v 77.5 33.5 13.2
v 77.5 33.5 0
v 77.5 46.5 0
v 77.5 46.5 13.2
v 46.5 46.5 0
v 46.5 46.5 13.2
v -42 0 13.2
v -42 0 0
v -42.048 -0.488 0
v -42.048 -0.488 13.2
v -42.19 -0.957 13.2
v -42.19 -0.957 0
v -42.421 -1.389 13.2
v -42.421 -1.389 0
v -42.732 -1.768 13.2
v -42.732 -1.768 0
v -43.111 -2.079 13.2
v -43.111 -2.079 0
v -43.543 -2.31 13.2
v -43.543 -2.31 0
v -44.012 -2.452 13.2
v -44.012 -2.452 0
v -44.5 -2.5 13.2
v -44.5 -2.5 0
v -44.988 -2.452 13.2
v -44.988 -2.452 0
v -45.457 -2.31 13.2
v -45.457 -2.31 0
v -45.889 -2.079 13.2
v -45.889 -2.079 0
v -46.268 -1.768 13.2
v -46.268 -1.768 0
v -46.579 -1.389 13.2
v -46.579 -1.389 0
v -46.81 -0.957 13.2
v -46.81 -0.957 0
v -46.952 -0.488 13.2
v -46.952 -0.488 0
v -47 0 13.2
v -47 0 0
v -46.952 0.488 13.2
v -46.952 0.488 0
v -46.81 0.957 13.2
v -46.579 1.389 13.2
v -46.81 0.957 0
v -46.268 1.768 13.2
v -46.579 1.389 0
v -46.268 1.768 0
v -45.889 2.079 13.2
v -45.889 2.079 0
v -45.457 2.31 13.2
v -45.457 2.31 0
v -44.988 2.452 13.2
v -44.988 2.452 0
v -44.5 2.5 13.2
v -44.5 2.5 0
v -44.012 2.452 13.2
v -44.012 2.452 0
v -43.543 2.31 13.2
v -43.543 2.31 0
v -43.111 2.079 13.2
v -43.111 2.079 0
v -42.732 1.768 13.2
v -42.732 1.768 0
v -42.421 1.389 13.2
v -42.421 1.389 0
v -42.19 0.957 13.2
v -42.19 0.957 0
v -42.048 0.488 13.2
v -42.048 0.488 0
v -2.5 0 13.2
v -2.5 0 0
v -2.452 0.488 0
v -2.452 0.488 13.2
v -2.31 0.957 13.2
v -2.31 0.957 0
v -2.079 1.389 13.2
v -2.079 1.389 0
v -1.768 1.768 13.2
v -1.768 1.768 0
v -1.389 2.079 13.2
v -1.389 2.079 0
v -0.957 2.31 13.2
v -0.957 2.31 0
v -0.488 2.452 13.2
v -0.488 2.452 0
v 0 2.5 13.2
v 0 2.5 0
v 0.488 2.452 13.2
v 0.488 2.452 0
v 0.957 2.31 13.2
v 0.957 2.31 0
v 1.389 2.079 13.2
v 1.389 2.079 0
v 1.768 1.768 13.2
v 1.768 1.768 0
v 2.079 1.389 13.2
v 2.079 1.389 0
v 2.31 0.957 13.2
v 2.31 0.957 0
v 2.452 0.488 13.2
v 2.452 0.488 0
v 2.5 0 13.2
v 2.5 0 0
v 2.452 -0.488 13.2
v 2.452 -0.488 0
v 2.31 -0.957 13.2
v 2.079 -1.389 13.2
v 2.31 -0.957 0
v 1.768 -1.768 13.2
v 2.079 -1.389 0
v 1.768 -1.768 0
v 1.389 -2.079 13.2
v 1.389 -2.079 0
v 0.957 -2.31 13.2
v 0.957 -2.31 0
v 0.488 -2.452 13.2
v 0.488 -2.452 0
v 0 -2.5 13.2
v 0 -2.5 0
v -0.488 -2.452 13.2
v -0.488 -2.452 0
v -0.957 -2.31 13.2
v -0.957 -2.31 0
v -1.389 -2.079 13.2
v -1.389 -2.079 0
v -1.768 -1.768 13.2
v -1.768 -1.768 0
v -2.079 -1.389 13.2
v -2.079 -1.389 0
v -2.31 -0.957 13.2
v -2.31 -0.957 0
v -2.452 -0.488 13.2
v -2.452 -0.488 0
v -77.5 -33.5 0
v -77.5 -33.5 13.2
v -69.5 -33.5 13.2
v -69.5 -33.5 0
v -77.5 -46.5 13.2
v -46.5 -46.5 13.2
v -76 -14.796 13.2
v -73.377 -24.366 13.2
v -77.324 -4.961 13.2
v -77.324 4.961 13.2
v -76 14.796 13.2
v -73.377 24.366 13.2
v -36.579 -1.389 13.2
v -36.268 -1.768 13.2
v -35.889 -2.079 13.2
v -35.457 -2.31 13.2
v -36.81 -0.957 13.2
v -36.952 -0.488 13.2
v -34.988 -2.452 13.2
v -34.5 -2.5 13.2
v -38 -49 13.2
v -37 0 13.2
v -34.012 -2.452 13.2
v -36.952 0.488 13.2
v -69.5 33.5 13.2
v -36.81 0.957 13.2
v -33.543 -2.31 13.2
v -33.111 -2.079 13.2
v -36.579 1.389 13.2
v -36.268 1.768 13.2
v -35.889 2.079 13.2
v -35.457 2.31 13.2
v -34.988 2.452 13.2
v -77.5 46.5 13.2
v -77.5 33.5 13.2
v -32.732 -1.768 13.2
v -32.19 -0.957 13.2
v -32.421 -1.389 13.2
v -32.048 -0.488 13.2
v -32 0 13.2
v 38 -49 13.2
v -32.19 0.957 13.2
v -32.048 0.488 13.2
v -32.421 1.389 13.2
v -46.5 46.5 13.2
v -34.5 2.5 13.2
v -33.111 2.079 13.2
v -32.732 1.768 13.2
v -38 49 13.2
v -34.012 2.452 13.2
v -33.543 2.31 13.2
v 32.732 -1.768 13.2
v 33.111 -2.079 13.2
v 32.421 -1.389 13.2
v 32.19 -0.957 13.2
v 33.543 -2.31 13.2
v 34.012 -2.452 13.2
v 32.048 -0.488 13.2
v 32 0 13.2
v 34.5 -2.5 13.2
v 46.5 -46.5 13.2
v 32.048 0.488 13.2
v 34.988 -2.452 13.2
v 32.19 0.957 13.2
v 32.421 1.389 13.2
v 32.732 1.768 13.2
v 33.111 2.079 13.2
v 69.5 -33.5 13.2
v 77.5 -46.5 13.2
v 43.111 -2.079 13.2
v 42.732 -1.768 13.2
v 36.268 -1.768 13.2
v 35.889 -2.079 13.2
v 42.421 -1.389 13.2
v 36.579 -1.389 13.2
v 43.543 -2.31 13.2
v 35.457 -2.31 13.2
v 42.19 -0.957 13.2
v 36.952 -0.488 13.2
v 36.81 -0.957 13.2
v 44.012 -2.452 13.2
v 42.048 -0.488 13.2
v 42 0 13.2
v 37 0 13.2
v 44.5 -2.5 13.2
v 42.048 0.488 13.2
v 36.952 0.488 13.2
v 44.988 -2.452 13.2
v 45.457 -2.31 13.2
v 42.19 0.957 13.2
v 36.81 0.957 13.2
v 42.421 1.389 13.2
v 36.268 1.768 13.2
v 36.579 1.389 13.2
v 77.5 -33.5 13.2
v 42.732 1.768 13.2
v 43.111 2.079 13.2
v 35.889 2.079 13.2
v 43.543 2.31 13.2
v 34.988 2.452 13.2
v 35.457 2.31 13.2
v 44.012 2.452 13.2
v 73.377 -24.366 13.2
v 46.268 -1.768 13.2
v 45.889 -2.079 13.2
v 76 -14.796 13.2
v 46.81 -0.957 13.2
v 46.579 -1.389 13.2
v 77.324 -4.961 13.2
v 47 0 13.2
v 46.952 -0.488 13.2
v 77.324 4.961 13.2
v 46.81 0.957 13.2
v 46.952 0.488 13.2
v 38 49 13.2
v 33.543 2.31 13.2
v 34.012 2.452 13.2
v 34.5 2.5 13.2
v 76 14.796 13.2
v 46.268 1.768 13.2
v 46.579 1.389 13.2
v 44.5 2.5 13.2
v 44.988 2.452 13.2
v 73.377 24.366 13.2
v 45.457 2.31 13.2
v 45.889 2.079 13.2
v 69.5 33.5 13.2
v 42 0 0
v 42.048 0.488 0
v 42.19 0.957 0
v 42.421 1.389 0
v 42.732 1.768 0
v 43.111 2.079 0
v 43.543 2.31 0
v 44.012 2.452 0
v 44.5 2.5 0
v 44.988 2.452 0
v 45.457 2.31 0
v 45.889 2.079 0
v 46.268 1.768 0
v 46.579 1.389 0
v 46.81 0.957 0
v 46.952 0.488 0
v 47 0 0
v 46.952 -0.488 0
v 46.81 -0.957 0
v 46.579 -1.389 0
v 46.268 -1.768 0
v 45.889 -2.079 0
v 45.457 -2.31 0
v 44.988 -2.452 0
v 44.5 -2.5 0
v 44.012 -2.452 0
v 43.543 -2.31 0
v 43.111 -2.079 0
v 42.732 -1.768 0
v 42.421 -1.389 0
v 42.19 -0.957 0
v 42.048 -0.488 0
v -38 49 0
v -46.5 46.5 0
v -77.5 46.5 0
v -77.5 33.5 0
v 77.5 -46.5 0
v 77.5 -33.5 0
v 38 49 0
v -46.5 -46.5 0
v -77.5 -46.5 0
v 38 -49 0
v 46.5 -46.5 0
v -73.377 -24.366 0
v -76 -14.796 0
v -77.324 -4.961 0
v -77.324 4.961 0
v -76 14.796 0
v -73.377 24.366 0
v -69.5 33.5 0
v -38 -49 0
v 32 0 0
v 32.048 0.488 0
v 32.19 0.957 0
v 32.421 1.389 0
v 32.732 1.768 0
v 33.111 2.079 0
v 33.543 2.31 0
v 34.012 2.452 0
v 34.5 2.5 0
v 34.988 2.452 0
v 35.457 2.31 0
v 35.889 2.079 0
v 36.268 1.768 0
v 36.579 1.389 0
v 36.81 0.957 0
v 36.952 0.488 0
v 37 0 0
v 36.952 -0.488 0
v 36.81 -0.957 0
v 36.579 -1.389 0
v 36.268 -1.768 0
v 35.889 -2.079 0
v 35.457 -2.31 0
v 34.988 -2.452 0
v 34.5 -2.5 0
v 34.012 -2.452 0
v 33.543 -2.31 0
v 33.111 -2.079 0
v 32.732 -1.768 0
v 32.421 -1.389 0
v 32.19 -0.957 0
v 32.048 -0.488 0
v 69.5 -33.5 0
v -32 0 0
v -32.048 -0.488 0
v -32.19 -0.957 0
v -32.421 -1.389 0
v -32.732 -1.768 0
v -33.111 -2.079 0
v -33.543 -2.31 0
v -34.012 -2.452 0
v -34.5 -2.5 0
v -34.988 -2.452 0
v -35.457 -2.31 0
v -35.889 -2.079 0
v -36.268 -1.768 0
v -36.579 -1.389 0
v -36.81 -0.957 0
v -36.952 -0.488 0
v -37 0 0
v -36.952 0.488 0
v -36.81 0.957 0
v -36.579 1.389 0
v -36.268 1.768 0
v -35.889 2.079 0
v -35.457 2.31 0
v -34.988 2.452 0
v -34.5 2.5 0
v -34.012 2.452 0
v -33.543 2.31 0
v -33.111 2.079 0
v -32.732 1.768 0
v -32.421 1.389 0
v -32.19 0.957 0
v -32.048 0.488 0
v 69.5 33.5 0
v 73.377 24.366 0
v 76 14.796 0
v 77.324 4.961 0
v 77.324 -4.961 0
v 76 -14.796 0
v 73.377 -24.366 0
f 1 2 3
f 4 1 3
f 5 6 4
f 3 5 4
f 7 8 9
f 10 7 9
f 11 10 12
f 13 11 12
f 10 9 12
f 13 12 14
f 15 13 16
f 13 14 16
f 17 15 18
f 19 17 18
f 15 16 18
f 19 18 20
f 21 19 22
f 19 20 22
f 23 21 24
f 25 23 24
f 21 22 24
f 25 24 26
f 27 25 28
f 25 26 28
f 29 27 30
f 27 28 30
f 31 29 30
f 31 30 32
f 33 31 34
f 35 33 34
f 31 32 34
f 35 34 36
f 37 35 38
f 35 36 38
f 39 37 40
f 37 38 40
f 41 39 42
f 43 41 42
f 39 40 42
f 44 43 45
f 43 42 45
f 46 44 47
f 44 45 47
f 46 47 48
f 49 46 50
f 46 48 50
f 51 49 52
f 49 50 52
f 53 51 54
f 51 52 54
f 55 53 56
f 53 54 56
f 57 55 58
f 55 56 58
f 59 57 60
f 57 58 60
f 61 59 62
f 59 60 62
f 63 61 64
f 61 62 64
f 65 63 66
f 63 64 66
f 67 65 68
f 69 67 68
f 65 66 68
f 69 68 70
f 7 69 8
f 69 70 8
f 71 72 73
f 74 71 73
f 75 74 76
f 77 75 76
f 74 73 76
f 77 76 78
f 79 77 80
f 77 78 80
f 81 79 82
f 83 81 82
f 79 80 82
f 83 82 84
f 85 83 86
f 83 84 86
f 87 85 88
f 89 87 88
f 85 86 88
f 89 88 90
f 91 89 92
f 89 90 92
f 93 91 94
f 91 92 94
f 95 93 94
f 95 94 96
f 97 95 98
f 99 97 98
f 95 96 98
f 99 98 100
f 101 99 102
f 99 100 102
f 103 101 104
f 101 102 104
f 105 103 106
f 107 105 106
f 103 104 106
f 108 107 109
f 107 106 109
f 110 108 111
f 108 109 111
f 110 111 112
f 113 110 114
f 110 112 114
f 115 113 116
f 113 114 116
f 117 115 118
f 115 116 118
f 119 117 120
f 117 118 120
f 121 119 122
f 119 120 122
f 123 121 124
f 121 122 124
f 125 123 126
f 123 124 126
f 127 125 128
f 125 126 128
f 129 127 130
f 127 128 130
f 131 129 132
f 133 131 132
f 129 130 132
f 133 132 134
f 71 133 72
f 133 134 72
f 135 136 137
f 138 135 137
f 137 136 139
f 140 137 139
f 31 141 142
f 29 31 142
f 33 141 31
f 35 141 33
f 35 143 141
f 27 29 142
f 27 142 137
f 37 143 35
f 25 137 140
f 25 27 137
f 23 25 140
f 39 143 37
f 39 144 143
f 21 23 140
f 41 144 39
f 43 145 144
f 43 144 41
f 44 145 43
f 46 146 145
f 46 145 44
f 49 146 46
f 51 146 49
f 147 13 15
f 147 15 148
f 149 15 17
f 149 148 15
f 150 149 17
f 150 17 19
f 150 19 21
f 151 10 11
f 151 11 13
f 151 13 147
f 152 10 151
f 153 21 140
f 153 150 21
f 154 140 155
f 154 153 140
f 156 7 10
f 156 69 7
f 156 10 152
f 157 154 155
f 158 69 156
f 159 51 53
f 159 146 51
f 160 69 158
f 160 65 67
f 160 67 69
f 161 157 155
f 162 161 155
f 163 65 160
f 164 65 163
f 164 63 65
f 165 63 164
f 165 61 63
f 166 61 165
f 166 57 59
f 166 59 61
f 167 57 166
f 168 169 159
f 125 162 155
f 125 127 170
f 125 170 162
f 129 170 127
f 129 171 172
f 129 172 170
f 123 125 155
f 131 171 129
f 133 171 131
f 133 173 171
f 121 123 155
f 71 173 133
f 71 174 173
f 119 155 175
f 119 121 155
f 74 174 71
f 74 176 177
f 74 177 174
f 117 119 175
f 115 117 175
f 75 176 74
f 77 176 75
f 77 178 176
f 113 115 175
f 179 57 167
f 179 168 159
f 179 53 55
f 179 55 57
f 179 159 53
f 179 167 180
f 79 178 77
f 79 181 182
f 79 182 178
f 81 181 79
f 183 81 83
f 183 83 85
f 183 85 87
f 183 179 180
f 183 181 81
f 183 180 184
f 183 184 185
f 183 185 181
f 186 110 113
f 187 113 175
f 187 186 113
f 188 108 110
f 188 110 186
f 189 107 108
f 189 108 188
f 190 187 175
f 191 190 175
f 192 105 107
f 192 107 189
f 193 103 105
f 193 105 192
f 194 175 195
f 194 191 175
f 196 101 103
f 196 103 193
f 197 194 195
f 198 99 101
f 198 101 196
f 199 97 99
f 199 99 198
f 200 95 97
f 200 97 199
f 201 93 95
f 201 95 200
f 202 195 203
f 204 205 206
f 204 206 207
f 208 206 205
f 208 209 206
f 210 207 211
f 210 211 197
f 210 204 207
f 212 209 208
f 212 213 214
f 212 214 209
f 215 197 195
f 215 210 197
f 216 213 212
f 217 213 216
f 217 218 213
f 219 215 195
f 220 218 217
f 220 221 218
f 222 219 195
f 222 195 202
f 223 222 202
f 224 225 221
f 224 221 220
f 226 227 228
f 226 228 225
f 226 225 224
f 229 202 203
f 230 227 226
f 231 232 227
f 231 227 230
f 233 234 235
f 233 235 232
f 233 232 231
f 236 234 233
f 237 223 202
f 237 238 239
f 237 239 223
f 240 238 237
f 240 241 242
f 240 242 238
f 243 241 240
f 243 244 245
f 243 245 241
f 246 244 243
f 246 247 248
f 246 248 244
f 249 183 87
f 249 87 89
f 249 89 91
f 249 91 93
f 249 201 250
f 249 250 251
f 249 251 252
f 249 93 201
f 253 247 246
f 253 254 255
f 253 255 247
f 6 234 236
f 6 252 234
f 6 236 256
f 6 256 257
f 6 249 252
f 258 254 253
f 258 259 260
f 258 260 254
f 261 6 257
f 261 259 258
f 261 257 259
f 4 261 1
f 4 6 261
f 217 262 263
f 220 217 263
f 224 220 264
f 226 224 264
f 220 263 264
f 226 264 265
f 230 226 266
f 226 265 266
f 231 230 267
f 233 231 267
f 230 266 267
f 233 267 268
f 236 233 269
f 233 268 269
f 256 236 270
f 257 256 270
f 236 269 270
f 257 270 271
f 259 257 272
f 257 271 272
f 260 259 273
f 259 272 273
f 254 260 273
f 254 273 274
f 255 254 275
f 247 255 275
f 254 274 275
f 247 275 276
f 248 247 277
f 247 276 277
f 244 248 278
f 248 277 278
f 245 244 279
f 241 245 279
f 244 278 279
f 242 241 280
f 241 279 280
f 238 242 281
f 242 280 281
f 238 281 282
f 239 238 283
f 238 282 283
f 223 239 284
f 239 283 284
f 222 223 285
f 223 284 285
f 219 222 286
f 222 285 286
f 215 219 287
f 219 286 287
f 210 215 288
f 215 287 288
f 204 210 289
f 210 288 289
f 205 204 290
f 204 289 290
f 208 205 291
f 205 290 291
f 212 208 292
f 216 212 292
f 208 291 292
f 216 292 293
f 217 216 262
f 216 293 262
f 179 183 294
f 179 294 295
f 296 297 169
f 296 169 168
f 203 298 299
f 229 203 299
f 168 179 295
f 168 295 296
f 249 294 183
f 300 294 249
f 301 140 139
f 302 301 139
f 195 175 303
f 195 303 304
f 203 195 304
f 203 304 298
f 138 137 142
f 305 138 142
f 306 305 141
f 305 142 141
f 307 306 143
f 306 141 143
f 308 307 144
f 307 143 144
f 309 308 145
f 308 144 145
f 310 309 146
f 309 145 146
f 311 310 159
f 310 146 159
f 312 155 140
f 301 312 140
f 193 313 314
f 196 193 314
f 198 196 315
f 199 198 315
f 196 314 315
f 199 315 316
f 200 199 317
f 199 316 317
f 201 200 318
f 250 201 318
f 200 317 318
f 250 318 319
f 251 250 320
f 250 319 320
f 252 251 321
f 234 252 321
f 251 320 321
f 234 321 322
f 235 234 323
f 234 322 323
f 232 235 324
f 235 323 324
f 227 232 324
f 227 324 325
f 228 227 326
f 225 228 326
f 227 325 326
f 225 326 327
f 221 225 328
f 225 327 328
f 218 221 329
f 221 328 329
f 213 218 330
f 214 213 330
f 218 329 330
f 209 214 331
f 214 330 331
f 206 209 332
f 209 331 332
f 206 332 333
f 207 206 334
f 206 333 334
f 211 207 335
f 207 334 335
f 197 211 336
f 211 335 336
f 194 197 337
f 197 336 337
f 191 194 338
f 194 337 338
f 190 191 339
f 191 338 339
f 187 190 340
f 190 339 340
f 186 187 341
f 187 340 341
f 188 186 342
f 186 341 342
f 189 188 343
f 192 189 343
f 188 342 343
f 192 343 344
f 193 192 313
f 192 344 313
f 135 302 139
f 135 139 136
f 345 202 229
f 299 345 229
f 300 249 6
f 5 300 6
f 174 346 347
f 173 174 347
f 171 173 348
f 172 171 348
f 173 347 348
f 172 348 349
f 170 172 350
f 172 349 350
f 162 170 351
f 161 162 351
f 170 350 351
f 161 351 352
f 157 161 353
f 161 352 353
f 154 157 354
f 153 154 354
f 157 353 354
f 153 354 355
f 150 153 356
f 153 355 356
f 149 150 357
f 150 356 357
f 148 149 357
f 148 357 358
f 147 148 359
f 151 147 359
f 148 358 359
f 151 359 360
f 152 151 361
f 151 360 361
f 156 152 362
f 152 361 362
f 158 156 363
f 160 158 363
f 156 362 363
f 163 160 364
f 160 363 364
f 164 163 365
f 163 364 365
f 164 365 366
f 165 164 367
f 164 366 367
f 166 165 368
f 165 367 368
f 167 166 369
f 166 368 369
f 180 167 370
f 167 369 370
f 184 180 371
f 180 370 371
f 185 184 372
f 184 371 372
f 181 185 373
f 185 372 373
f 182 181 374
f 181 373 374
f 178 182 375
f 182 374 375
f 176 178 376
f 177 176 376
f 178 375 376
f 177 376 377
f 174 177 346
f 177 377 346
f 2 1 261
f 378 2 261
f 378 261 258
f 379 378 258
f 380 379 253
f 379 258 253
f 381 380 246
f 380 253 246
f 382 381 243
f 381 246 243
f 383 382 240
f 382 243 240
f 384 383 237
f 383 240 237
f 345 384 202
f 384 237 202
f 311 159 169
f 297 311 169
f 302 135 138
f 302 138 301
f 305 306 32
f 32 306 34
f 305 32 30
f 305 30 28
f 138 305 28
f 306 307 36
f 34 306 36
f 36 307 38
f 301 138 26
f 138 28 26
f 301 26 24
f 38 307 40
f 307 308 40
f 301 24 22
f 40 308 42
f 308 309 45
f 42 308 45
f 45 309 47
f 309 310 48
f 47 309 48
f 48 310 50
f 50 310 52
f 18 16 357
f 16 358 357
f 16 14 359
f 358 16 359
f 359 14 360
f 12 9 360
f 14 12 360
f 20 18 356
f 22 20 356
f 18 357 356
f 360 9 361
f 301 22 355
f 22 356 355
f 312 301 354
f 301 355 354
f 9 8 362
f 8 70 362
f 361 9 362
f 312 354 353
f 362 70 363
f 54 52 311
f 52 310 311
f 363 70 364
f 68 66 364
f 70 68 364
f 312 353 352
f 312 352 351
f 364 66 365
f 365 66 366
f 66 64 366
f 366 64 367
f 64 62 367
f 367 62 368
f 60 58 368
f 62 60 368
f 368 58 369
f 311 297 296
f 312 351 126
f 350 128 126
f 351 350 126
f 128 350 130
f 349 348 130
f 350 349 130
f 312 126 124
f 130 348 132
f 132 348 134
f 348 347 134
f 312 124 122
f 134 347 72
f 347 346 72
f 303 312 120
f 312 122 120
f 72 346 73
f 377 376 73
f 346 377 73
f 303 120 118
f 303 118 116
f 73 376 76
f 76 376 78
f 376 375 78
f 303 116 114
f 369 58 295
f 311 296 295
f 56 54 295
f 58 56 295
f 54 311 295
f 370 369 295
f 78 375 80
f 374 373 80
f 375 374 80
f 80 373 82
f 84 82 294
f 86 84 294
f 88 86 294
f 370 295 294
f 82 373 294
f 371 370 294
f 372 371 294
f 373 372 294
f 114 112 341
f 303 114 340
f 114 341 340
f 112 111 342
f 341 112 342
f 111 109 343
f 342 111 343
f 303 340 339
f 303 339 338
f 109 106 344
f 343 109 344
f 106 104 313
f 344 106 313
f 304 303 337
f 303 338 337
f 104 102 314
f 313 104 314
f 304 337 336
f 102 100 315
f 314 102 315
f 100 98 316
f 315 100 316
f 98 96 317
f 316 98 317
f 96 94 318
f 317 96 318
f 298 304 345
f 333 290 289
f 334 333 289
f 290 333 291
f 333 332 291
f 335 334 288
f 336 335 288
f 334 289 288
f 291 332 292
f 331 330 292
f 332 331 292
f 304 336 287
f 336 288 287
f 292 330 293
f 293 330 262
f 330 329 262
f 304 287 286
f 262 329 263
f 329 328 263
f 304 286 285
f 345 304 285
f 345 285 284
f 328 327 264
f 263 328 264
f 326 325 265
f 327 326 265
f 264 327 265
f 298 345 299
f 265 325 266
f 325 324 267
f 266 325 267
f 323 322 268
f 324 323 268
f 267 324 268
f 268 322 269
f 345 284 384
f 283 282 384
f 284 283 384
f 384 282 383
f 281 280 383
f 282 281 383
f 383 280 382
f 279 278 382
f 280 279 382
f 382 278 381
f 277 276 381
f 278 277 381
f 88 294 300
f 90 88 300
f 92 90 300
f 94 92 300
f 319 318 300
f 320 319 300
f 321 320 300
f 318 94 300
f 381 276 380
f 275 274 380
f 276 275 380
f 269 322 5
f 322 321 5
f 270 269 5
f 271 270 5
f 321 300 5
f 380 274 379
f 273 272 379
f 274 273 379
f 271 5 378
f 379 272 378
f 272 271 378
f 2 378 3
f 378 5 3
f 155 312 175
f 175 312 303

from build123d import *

# Parameters (mm, degrees)
SKETCH_1_W          = 155
SKETCH_1_H          = 98
EXTRUDE_1_DEPTH     = 13.2
CUT_EXTRUDE_1_DEPTH = 93.636331965
CUT_EXTRUDE_2_DEPTH = 93.636331965
SKETCH_4_R          = 2.5
CUT_EXTRUDE_3_DEPTH = 13.2


with BuildPart() as part:
    # 草图1 → 凸台-拉伸1 (new body)
    with BuildSketch(Plane.XY):
        Rectangle(SKETCH_1_W, SKETCH_1_H)
    extrude(amount=EXTRUDE_1_DEPTH)

    # 草图2 → 切除-拉伸1 (cut, through all)
    with BuildSketch(Plane.XY.offset(13.2)):
        Polygon((-38, 49), (-46.5, 46.5), (-77.5, 46.5), (-77.5, 49), align=None)
        Polygon((77.5, 49), (38, 49), (46.5, 46.5), (77.5, 46.5), align=None)
        Polygon((38, -49), (46.5, -46.5), (77.5, -46.5), (77.5, -49), align=None)
        Polygon((-77.5, -49), (-38, -49), (-46.5, -46.5), (-77.5, -46.5), align=None)
    extrude(amount=-CUT_EXTRUDE_1_DEPTH, mode=Mode.SUBTRACT)

    # 草图3 → 切除-拉伸2 (cut, through all)
    with BuildSketch(Plane.XY.offset(13.2)):
        with BuildLine():
            Line((-77.5, -33.5), (-69.5, -33.5))
            ThreePointArc((-69.5, -33.5), (-77.49, 0), (-69.5, 33.5))
            Line((-69.5, 33.5), (-77.5, 33.5))
            Line((-77.5, 33.5), (-77.5, -33.5))
        make_face()
        with BuildLine():
            Line((77.5, -33.5), (77.5, 33.5))
            Line((77.5, 33.5), (69.5, 33.5))
            ThreePointArc((69.5, 33.5), (77.49, 0), (69.5, -33.5))
            Line((69.5, -33.5), (77.5, -33.5))
        make_face()
    extrude(amount=-CUT_EXTRUDE_2_DEPTH, mode=Mode.SUBTRACT)

    # 草图4 → 切除-拉伸3 (cut)
    with BuildSketch(Plane(origin=(0, 0, 0), x_dir=(-1, 0, 0), z_dir=(0, 0, -1))):
        with Locations((-44.5, 0)):
            Circle(SKETCH_4_R)
        with Locations((-34.5, 0)):
            Circle(SKETCH_4_R)
        Circle(SKETCH_4_R)
        with Locations(Location((34.5, 0, 0), (0, 0, 180))):
            Circle(SKETCH_4_R)
        with Locations(Location((44.5, 0, 0), (0, 0, 180))):
            Circle(SKETCH_4_R)
    extrude(amount=-CUT_EXTRUDE_3_DEPTH, mode=Mode.SUBTRACT)


solid = part.part
